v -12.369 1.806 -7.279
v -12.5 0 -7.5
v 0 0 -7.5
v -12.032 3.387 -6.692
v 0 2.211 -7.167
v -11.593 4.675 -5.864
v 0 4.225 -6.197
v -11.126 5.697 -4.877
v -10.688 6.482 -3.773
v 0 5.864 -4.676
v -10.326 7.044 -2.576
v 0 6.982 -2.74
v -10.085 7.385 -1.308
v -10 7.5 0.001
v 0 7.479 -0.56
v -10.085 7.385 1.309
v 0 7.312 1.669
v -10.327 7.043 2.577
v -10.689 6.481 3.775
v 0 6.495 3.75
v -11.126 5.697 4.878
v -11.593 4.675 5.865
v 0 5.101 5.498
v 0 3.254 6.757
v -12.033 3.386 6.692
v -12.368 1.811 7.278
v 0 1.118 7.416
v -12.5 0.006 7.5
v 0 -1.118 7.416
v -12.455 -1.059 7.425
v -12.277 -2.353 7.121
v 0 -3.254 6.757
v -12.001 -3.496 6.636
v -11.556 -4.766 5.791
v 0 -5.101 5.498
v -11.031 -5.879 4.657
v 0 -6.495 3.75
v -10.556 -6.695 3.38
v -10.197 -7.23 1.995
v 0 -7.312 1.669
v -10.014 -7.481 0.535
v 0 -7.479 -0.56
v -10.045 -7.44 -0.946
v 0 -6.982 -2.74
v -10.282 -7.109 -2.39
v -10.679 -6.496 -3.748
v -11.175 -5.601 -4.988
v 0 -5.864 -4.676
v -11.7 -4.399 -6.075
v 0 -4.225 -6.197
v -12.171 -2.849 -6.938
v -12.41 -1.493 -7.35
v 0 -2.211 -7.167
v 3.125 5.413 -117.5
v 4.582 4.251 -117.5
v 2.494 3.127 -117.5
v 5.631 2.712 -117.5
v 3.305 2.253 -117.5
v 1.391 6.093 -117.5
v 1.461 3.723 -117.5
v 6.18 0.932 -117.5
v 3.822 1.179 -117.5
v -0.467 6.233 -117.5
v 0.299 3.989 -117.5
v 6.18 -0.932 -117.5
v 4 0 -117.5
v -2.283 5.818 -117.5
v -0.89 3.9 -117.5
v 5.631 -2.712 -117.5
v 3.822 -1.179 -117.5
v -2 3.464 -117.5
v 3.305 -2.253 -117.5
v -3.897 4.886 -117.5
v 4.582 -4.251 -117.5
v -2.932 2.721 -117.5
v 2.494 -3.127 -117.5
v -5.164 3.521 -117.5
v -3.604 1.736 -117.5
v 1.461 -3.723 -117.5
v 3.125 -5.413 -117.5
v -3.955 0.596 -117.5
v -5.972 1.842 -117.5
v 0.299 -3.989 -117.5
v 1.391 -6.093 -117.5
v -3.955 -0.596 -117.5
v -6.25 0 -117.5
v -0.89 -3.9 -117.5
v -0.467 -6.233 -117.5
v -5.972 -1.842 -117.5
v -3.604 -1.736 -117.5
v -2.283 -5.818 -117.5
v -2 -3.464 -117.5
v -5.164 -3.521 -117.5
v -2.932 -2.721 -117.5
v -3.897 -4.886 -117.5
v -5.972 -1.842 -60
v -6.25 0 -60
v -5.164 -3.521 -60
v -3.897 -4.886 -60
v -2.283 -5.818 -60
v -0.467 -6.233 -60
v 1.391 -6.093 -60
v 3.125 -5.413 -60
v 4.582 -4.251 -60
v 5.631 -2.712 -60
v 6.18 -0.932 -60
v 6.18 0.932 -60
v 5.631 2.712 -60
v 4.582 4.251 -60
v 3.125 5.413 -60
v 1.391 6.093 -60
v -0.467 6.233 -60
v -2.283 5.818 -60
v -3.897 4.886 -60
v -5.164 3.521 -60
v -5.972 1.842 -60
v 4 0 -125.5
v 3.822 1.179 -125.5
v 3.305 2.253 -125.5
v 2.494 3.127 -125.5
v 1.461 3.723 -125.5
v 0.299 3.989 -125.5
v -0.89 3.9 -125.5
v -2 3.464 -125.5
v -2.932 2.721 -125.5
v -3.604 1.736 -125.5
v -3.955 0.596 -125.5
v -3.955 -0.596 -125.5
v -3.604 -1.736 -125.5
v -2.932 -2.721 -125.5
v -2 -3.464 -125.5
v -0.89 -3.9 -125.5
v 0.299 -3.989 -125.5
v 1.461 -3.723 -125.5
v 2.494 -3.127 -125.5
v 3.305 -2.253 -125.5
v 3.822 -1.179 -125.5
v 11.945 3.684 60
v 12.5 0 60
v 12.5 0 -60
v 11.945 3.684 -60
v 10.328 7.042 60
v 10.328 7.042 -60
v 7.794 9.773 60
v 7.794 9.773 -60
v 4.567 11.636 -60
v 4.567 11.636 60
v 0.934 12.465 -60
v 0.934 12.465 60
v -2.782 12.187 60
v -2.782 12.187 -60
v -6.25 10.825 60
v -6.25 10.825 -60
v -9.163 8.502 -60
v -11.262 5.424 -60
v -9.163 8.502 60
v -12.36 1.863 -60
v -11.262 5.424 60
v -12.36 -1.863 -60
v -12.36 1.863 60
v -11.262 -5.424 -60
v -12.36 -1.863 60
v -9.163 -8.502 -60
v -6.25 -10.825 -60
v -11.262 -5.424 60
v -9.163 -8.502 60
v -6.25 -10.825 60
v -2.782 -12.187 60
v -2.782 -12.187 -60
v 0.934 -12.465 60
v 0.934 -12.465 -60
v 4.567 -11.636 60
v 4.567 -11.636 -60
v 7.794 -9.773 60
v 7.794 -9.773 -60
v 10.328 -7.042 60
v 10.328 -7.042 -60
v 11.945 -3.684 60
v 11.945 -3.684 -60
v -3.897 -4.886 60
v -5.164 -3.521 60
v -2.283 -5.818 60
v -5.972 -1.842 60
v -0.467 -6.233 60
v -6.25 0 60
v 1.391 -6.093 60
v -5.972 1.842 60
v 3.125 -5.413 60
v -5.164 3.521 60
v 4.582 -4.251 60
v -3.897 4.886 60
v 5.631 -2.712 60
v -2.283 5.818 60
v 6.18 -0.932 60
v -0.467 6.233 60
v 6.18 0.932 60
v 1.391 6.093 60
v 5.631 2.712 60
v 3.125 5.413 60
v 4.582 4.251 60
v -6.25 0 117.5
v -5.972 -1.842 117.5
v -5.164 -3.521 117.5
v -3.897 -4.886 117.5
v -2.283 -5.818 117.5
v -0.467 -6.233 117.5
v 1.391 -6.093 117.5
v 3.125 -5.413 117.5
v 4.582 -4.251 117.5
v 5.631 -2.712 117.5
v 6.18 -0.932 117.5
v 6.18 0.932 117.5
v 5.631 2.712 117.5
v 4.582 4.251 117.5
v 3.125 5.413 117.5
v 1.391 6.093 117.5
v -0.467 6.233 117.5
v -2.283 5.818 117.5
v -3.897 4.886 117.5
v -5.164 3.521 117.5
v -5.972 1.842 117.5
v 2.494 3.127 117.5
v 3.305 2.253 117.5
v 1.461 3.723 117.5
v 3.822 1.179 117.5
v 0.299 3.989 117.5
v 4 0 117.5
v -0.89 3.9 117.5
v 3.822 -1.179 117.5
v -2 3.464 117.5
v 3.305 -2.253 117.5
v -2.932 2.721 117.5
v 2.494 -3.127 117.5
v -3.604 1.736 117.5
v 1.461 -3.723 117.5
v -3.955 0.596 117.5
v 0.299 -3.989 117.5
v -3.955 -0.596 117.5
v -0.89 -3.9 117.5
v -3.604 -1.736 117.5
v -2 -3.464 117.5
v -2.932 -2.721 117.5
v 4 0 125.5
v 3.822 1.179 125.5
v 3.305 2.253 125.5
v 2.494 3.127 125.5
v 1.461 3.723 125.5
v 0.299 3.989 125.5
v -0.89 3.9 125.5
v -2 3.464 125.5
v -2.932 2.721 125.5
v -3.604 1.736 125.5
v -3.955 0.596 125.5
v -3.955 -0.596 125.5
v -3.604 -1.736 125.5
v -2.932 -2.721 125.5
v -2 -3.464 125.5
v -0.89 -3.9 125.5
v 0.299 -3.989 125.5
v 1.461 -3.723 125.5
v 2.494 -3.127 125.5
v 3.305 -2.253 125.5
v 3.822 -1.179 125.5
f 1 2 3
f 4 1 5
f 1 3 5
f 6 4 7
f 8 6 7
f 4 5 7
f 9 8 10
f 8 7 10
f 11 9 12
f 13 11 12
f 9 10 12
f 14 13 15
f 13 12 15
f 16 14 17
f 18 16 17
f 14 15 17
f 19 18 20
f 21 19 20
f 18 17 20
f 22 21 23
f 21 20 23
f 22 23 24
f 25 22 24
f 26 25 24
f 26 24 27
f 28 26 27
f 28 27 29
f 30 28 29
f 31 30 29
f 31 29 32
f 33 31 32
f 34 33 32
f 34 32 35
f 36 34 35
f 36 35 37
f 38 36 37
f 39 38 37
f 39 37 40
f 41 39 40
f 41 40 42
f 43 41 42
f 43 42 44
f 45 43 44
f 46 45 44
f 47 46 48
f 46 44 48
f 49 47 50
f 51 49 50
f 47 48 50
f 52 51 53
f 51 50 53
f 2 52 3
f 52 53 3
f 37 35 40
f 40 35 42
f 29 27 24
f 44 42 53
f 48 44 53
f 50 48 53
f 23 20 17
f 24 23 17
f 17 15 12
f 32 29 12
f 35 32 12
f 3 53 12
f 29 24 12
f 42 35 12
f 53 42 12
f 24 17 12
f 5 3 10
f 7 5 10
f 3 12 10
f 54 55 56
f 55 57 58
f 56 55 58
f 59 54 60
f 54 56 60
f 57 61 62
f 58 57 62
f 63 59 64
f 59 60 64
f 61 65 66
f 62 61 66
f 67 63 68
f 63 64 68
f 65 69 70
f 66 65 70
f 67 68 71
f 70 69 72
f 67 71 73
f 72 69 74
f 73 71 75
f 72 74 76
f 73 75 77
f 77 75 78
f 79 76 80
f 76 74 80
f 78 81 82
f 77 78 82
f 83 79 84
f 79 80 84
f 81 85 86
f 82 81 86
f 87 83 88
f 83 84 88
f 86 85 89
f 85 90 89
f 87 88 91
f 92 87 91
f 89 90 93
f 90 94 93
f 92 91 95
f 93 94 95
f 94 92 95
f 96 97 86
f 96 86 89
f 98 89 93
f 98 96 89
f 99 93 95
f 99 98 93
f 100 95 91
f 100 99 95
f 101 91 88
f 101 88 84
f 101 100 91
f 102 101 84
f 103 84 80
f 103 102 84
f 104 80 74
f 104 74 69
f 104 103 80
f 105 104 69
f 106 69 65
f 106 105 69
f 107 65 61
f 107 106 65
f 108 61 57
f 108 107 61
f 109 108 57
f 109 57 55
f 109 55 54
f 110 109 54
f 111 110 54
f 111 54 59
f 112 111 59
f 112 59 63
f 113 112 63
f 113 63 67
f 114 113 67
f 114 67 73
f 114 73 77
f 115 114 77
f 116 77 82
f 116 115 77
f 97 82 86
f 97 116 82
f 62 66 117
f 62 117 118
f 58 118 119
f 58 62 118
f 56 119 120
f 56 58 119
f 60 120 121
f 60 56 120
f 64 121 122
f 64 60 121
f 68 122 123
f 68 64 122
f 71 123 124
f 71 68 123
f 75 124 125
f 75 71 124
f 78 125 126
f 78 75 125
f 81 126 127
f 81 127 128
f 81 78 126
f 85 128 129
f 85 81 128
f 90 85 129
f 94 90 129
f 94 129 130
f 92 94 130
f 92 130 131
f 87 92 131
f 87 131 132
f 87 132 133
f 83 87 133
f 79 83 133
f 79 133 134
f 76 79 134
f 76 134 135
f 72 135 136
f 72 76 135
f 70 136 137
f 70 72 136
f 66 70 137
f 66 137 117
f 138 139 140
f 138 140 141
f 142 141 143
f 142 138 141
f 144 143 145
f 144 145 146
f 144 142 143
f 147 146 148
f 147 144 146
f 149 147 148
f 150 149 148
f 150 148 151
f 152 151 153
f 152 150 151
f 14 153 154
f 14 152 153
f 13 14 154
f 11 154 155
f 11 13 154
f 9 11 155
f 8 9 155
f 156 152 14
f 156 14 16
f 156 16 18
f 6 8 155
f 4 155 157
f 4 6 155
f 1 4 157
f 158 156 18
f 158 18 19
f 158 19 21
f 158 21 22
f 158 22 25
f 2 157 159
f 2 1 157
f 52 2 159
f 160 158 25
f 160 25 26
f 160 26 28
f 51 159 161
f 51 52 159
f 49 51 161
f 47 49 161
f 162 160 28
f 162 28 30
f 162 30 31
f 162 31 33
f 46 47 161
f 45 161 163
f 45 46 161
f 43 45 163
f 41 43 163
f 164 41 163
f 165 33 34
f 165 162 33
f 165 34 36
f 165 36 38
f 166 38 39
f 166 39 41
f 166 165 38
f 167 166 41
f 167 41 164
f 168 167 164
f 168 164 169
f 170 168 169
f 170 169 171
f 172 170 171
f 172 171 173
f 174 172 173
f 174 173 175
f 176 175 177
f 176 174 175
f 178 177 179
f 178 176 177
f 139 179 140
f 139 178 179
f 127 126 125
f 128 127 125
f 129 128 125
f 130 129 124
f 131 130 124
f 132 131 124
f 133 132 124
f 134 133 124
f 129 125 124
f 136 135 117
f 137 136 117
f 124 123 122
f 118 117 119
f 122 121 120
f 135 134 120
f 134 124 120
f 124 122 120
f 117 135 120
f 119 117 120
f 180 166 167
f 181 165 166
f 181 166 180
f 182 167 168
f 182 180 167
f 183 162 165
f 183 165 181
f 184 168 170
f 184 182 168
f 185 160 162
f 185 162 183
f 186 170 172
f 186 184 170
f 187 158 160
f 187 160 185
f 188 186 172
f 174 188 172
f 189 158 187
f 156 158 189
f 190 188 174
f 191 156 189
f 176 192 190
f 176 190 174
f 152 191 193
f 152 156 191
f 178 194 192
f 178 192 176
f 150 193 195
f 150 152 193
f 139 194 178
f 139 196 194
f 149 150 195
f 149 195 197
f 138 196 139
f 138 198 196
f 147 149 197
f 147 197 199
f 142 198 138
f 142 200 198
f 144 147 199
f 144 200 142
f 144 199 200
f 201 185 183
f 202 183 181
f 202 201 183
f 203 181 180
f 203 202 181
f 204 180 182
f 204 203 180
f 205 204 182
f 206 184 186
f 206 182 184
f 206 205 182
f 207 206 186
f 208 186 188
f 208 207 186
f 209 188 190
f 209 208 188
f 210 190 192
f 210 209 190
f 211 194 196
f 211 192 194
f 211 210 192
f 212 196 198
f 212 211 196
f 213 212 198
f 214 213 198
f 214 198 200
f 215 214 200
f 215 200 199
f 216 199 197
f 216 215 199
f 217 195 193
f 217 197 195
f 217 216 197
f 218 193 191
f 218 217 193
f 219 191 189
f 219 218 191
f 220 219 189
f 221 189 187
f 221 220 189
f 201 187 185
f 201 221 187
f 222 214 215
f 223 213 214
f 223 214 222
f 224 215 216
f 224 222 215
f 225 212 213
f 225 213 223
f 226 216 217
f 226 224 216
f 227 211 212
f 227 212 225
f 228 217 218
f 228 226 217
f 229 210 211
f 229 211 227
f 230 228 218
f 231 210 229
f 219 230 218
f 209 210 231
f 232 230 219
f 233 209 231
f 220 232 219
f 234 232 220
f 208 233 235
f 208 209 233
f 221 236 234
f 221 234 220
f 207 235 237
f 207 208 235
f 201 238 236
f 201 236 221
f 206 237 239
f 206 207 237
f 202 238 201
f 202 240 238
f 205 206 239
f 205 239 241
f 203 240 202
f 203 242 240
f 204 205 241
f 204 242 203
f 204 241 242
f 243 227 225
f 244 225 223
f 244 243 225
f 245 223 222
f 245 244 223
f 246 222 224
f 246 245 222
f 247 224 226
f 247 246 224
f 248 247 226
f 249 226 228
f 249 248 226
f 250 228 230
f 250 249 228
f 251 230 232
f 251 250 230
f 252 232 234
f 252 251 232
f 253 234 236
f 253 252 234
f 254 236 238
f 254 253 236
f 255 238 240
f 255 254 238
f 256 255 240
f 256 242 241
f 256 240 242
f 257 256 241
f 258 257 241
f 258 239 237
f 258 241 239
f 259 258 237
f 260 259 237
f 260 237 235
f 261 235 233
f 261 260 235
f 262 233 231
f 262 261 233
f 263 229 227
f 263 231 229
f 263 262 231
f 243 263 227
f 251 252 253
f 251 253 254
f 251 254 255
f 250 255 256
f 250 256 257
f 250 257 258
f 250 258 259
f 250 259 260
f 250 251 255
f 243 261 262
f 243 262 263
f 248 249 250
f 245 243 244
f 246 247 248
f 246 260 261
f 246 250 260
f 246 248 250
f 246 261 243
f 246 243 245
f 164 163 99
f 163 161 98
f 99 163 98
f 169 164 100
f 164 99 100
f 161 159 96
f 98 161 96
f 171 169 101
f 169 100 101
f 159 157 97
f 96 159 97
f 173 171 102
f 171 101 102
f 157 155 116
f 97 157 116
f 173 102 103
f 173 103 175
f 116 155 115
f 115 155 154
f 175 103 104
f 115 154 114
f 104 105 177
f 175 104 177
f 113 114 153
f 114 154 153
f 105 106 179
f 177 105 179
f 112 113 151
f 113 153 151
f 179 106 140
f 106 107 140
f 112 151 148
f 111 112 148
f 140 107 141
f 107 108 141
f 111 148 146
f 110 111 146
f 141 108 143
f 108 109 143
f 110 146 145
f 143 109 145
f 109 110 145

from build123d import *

# Parameters (mm, degrees)
SKETCH3_R           = 12.5
SKETCH3_R_2         = 6.25
BOSS_EXTRUDE1_DEPTH = 60
SKETCH3_3_R         = 6.25
SKETCH3_3_R_2       = 4
BOSS_EXTRUDE2_DEPTH = 117.5
SKETCH3_4_R         = 4
BOSS_EXTRUDE3_DEPTH = 125.5
SKETCH5_R           = 7.5
CUT_EXTRUDE4_DEPTH  = 127.73890484


with BuildPart() as part:
    # Sketch3 → Boss-Extrude1 (new, symmetric)
    with BuildSketch(Plane.XY):
        Circle(SKETCH3_R)
        Circle(SKETCH3_R_2, mode=Mode.SUBTRACT)
    extrude(amount=BOSS_EXTRUDE1_DEPTH, both=True)

    # Sketch3<3> → Boss-Extrude2 (add, symmetric)
    with BuildSketch(Plane.XY):
        Circle(SKETCH3_3_R)
        Circle(SKETCH3_3_R_2, mode=Mode.SUBTRACT)
    extrude(amount=BOSS_EXTRUDE2_DEPTH, both=True)

    # Sketch3<4> → Boss-Extrude3 (add, symmetric)
    with BuildSketch(Plane.XY):
        Circle(SKETCH3_4_R)
    extrude(amount=BOSS_EXTRUDE3_DEPTH, both=True)

    # Sketch5 → Cut-Extrude4 (cut, through all)
    with BuildSketch(Plane(origin=(0, 0, 0), x_dir=(0, 0, -1), z_dir=(1, 0, 0))):
        Circle(SKETCH5_R)
    extrude(amount=-CUT_EXTRUDE4_DEPTH, mode=Mode.SUBTRACT)


solid = part.part
